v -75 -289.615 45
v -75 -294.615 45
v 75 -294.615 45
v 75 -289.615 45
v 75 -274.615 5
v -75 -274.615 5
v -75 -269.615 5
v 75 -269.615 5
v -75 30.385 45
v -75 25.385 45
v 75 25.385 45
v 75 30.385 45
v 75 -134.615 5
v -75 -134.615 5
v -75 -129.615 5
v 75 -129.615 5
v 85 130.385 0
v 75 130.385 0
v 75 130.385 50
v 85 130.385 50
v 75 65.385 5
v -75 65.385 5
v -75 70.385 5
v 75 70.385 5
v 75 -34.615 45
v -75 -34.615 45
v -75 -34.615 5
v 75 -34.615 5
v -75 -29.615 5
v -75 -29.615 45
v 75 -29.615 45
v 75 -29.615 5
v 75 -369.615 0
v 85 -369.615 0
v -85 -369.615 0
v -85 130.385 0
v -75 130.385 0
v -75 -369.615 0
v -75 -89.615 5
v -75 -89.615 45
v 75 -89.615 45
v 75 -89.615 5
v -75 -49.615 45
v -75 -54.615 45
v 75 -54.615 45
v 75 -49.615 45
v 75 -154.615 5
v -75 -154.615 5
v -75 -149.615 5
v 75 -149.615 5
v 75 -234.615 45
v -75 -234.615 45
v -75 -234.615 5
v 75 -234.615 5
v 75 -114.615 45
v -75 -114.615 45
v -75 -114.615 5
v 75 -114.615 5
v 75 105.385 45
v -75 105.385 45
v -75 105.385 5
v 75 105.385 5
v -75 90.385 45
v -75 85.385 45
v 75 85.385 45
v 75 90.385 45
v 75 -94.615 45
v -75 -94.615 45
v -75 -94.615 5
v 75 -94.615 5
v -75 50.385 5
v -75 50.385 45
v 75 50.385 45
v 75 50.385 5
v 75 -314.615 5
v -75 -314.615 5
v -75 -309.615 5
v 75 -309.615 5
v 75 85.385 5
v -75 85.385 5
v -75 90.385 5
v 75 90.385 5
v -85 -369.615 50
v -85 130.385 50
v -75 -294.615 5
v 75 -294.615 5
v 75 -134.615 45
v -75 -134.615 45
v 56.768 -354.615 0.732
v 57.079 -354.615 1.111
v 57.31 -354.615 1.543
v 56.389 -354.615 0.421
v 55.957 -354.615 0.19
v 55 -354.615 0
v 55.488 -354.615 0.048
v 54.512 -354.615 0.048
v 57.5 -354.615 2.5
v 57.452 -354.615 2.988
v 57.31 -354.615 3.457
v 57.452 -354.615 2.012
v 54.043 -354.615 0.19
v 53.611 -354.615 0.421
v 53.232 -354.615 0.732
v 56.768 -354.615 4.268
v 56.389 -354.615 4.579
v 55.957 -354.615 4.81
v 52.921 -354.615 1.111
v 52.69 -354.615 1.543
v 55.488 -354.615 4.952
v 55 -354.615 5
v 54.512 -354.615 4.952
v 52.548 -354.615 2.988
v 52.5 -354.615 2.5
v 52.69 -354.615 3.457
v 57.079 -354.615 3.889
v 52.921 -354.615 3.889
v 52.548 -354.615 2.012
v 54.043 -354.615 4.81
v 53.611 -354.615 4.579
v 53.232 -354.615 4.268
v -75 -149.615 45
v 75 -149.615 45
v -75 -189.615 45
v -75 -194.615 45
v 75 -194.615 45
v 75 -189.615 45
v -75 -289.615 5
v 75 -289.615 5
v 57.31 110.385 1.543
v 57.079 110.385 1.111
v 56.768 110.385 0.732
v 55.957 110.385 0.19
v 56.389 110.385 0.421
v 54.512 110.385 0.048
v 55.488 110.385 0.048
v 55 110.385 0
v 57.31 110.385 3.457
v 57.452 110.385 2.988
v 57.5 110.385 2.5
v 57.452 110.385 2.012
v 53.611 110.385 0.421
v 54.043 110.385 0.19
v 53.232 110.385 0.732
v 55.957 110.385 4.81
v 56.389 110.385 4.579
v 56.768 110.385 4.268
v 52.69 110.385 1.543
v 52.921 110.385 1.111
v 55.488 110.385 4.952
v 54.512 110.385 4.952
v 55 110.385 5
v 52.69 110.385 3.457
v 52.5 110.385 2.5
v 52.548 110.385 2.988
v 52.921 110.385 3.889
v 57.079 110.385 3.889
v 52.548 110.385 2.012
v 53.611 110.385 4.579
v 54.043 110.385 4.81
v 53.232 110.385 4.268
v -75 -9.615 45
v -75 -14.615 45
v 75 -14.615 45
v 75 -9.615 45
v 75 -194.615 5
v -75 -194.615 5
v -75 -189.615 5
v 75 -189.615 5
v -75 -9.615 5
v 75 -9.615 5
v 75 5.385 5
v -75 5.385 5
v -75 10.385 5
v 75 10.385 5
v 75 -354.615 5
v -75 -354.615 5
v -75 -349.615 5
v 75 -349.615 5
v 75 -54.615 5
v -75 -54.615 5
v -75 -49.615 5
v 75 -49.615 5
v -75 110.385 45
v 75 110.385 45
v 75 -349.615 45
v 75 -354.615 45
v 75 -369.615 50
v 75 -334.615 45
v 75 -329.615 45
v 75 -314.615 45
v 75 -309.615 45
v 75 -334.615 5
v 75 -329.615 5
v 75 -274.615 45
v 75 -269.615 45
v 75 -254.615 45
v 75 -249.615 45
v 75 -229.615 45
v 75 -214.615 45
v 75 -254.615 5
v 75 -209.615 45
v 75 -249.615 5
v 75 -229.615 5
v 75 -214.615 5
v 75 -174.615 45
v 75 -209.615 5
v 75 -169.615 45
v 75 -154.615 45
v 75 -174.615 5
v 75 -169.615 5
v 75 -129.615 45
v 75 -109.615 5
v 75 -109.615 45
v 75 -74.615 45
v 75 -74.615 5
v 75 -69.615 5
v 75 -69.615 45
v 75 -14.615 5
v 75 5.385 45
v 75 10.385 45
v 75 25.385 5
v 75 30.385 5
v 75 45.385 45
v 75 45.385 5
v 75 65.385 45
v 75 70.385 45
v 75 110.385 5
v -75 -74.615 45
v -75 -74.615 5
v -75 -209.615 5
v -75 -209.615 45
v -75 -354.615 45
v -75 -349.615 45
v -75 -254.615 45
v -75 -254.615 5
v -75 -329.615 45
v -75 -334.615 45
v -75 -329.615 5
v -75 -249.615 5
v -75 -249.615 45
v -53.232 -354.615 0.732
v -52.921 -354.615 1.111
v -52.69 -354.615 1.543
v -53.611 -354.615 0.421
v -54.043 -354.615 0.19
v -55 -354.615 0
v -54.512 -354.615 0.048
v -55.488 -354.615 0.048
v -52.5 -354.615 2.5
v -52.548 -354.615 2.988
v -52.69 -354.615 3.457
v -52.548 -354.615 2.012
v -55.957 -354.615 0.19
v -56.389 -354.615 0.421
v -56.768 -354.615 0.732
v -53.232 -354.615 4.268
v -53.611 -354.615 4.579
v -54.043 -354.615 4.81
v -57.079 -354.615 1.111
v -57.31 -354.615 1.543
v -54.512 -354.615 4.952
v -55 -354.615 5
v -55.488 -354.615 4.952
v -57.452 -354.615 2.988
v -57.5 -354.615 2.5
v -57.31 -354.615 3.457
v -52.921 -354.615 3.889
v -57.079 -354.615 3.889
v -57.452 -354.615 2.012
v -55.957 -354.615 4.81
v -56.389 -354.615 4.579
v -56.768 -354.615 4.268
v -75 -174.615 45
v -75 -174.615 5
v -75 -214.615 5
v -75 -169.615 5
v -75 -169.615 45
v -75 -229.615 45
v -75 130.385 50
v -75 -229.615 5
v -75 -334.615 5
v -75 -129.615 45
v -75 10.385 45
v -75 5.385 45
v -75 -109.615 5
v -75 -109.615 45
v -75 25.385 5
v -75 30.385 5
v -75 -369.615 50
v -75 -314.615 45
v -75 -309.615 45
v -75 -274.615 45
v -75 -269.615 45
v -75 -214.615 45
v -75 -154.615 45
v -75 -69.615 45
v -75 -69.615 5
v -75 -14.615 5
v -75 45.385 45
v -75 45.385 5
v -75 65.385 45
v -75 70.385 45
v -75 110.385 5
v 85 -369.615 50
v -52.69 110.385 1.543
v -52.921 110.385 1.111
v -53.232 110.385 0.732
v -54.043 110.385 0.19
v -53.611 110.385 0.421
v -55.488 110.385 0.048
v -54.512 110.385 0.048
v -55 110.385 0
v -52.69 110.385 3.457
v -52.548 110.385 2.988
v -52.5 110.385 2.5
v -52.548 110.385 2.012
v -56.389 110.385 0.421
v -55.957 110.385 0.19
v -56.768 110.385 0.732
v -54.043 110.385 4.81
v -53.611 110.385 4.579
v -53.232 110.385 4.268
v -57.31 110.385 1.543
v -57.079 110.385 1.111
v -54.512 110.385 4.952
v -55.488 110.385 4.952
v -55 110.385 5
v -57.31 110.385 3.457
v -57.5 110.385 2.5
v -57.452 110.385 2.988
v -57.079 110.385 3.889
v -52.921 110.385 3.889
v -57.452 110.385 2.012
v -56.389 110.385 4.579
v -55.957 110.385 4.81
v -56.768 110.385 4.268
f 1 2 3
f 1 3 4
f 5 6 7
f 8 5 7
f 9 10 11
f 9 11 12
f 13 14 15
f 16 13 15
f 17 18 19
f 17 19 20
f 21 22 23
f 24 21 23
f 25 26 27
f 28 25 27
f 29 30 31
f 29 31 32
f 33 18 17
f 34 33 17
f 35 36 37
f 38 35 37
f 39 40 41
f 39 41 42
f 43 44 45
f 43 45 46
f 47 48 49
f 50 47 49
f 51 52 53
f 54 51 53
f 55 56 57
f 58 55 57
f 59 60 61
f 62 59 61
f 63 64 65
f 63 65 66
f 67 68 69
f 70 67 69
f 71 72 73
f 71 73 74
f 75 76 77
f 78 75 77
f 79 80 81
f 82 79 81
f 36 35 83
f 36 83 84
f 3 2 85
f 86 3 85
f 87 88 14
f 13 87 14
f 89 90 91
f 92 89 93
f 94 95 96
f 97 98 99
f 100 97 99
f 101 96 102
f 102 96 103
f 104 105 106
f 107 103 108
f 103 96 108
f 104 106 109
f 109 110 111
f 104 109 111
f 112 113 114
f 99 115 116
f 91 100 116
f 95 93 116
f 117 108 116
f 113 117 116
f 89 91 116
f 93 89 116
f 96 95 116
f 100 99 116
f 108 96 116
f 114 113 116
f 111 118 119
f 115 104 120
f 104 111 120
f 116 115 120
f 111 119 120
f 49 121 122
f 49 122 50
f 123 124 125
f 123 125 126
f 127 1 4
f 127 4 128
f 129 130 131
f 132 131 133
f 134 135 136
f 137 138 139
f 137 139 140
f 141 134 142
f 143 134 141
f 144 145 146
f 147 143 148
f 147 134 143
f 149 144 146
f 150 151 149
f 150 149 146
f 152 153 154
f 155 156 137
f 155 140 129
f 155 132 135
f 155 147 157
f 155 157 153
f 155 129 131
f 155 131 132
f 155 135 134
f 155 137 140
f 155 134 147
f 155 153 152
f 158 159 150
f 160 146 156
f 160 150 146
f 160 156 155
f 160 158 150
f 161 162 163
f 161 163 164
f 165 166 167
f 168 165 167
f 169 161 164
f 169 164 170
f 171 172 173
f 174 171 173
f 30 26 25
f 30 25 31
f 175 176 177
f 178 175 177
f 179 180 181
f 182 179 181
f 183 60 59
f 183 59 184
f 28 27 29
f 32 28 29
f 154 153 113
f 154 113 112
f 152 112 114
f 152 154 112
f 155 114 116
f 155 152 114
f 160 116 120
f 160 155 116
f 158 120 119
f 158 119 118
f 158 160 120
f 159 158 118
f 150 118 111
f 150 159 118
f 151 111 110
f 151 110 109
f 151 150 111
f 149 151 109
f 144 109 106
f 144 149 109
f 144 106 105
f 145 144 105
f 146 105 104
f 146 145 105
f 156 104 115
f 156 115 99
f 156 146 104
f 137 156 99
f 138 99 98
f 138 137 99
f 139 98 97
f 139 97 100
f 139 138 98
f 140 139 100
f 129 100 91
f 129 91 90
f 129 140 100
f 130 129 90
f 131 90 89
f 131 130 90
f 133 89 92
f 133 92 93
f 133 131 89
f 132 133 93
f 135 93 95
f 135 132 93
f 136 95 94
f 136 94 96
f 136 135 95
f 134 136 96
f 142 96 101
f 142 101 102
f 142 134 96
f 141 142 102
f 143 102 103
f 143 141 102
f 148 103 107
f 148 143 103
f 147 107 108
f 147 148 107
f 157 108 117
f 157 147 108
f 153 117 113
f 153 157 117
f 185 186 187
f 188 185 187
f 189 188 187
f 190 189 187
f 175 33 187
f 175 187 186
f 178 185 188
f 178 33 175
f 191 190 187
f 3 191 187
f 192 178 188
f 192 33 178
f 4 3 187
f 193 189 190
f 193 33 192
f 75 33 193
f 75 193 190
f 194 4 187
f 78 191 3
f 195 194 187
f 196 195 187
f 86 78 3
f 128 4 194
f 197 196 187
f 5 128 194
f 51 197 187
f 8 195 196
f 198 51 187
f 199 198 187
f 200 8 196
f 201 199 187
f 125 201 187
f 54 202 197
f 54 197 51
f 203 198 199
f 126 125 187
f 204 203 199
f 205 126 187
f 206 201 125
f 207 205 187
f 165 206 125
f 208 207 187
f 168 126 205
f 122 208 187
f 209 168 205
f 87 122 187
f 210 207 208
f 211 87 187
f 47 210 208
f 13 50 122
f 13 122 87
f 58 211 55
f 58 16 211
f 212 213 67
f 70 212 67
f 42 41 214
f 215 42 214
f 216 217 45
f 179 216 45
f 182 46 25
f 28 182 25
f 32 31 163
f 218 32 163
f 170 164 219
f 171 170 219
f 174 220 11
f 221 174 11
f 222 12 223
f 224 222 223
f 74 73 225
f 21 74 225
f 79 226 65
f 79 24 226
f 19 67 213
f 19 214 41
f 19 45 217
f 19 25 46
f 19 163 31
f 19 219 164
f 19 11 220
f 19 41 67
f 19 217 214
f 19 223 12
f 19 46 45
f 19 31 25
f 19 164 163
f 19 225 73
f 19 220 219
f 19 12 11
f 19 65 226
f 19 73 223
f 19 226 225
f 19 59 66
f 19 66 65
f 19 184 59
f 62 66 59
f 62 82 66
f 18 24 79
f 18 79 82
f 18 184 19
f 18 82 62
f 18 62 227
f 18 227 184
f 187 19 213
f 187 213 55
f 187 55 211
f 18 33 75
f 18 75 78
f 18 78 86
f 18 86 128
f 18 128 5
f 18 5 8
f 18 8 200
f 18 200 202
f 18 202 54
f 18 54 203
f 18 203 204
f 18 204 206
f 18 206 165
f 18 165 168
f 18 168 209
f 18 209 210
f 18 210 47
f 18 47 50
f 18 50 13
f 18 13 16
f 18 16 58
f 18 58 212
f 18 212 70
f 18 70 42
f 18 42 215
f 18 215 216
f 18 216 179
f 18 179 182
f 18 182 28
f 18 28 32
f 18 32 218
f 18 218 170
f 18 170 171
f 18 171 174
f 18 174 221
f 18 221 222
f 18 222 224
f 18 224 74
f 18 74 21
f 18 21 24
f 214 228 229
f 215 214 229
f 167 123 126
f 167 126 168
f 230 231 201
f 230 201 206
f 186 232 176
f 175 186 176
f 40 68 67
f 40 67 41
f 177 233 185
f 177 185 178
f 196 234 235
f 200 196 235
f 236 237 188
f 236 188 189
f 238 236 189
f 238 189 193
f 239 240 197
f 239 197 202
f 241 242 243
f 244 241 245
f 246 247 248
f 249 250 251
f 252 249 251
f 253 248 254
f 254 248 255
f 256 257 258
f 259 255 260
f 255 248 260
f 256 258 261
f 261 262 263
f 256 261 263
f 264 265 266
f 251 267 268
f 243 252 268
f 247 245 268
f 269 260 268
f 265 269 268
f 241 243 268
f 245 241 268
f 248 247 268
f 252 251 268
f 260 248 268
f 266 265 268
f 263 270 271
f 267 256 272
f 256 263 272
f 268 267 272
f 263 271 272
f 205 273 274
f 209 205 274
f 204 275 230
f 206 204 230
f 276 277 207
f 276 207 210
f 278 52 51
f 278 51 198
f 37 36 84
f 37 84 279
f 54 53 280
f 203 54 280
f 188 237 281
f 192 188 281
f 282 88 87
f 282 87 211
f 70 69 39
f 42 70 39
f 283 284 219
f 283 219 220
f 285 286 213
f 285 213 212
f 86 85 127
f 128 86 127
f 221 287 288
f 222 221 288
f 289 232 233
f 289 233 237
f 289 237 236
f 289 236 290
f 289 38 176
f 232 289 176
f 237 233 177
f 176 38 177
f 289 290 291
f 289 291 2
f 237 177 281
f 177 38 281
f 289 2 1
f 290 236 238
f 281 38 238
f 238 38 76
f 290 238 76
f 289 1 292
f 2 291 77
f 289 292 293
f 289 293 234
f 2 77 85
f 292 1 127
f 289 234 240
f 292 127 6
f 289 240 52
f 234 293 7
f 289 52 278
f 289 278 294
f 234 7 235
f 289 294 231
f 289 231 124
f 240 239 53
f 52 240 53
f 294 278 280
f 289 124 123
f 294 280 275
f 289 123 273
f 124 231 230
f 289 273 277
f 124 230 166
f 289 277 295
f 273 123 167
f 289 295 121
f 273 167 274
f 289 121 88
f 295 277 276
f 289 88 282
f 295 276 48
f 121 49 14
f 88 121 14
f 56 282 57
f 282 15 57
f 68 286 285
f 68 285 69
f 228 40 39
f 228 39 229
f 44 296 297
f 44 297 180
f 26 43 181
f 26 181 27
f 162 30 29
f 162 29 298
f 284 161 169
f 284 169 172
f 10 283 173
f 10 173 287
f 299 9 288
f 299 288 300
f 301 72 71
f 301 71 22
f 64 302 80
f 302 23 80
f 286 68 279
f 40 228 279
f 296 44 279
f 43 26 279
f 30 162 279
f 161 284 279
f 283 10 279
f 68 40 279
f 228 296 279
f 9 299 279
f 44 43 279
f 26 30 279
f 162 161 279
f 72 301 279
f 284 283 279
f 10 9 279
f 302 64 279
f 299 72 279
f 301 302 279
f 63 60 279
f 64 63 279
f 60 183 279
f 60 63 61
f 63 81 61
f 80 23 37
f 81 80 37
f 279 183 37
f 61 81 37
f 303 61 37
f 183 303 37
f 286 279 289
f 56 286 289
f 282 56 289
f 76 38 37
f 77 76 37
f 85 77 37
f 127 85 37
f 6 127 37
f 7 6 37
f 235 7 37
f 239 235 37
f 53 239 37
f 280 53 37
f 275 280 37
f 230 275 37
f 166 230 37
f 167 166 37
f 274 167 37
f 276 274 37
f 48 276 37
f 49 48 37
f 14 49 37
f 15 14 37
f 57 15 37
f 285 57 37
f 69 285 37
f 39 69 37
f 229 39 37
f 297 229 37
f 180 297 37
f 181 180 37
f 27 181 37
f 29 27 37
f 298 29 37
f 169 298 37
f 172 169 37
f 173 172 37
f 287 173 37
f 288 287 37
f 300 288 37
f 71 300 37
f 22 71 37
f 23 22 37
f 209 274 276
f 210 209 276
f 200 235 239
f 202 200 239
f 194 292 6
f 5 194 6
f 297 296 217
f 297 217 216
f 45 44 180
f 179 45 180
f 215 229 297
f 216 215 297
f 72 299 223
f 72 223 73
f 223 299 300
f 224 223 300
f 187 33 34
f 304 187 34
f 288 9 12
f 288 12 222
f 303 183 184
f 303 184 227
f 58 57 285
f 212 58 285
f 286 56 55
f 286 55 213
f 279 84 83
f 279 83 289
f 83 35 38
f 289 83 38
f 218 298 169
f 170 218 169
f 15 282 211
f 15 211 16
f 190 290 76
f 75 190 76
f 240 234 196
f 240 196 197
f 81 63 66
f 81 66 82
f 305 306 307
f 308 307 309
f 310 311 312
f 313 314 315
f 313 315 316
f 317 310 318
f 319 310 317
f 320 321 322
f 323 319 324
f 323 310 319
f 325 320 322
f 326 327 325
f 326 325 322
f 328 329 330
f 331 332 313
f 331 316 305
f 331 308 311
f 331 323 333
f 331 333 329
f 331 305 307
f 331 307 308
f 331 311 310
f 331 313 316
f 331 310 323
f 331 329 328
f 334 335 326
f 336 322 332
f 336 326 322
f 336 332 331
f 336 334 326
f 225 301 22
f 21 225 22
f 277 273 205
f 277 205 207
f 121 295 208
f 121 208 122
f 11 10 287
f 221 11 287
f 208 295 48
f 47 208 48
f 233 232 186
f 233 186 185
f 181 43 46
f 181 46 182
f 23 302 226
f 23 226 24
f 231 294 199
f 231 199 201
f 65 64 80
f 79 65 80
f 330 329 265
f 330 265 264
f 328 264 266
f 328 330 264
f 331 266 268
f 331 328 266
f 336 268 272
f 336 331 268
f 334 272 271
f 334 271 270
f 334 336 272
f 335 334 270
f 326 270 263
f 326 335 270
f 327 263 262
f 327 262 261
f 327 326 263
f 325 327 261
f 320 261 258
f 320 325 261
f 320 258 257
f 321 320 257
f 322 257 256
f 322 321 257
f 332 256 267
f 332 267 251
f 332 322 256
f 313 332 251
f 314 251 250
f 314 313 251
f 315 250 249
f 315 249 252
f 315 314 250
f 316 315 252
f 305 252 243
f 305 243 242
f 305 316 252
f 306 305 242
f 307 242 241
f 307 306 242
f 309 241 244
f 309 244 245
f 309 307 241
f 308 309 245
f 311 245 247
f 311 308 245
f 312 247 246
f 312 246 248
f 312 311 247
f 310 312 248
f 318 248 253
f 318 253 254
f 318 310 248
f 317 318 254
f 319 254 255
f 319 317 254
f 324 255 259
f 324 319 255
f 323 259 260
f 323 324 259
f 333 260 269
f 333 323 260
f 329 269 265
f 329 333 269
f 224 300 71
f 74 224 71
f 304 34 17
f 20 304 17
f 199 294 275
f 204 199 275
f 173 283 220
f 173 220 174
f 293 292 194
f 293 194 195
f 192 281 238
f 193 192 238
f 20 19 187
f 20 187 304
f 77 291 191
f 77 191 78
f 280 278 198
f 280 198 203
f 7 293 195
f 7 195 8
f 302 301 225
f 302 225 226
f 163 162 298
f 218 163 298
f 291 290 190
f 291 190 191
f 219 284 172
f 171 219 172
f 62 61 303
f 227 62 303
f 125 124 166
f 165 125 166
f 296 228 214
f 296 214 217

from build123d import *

# Parameters (mm, degrees)
SKETCH1_W             = 10
SKETCH1_H             = 500
BOSS_EXTRUDE1_DEPTH   = 50
BOSS_EXTRUDE1_2_DEPTH = 50
SKETCH2_W             = 40
SKETCH2_H             = 5
BOSS_EXTRUDE2_DEPTH   = 160
LPATTERN1_COUNT       = 24
LPATTERN1_PITCH       = 20
SKETCH4_R             = 2.5
BOSS_EXTRUDE3_DEPTH   = 465
BOSS_EXTRUDE3_2_DEPTH = 465


with BuildPart() as part:
    # Sketch1 → Boss-Extrude1 (new body)
    with BuildSketch(Plane.XY):
        with Locations((-80, -119.615384615)):
            Rectangle(SKETCH1_W, SKETCH1_H)
    extrude(amount=BOSS_EXTRUDE1_DEPTH)



with BuildPart() as body_2:
    # Sketch1 → Boss-Extrude1 2 (new body)
    with BuildSketch(Plane.XY):
        with Locations((80, -119.615384615)):
            Rectangle(SKETCH1_W, SKETCH1_H)
    extrude(amount=BOSS_EXTRUDE1_2_DEPTH)


with BuildPart() as part_1:
    add(part.part)

    add(body_2.part)  # Boss-Extrude2 merges body 2
    # Sketch2 → Boss-Extrude2 (add)
    with BuildSketch(Plane(origin=(-75, 0, 0), x_dir=(0, 0, -1), z_dir=(1, 0, 0))):
        with Locations((-25, 107.884615385)):
            Rectangle(SKETCH2_W, SKETCH2_H)
    boss_extrude2 = extrude(amount=BOSS_EXTRUDE2_DEPTH)

    # LPattern1: Boss-Extrude2 ×24
    with Locations(*[(0, -i * LPATTERN1_PITCH, 0) for i in range(1, LPATTERN1_COUNT)]):
        add(boss_extrude2)


with BuildPart() as body_2_2:
    # Sketch4 → Boss-Extrude3 (new body)
    with BuildSketch(Plane(origin=(0, 110.384615385, 0), x_dir=(1, 0, 0), z_dir=(0, 1, 0))):
        with Locations(Location((-55, -2.5, 0), (0, 0, 180))):
            Circle(SKETCH4_R)
    extrude(amount=-BOSS_EXTRUDE3_DEPTH)


with BuildPart() as body_3:
    # Sketch4 → Boss-Extrude3 2 (new body)
    with BuildSketch(Plane(origin=(0, 110.384615385, 0), x_dir=(1, 0, 0), z_dir=(0, 1, 0))):
        with Locations(Location((55, -2.5, 0), (0, 0, 180))):
            Circle(SKETCH4_R)
    extrude(amount=-BOSS_EXTRUDE3_2_DEPTH)


solid = Compound([part_1.part, body_2_2.part, body_3.part])
